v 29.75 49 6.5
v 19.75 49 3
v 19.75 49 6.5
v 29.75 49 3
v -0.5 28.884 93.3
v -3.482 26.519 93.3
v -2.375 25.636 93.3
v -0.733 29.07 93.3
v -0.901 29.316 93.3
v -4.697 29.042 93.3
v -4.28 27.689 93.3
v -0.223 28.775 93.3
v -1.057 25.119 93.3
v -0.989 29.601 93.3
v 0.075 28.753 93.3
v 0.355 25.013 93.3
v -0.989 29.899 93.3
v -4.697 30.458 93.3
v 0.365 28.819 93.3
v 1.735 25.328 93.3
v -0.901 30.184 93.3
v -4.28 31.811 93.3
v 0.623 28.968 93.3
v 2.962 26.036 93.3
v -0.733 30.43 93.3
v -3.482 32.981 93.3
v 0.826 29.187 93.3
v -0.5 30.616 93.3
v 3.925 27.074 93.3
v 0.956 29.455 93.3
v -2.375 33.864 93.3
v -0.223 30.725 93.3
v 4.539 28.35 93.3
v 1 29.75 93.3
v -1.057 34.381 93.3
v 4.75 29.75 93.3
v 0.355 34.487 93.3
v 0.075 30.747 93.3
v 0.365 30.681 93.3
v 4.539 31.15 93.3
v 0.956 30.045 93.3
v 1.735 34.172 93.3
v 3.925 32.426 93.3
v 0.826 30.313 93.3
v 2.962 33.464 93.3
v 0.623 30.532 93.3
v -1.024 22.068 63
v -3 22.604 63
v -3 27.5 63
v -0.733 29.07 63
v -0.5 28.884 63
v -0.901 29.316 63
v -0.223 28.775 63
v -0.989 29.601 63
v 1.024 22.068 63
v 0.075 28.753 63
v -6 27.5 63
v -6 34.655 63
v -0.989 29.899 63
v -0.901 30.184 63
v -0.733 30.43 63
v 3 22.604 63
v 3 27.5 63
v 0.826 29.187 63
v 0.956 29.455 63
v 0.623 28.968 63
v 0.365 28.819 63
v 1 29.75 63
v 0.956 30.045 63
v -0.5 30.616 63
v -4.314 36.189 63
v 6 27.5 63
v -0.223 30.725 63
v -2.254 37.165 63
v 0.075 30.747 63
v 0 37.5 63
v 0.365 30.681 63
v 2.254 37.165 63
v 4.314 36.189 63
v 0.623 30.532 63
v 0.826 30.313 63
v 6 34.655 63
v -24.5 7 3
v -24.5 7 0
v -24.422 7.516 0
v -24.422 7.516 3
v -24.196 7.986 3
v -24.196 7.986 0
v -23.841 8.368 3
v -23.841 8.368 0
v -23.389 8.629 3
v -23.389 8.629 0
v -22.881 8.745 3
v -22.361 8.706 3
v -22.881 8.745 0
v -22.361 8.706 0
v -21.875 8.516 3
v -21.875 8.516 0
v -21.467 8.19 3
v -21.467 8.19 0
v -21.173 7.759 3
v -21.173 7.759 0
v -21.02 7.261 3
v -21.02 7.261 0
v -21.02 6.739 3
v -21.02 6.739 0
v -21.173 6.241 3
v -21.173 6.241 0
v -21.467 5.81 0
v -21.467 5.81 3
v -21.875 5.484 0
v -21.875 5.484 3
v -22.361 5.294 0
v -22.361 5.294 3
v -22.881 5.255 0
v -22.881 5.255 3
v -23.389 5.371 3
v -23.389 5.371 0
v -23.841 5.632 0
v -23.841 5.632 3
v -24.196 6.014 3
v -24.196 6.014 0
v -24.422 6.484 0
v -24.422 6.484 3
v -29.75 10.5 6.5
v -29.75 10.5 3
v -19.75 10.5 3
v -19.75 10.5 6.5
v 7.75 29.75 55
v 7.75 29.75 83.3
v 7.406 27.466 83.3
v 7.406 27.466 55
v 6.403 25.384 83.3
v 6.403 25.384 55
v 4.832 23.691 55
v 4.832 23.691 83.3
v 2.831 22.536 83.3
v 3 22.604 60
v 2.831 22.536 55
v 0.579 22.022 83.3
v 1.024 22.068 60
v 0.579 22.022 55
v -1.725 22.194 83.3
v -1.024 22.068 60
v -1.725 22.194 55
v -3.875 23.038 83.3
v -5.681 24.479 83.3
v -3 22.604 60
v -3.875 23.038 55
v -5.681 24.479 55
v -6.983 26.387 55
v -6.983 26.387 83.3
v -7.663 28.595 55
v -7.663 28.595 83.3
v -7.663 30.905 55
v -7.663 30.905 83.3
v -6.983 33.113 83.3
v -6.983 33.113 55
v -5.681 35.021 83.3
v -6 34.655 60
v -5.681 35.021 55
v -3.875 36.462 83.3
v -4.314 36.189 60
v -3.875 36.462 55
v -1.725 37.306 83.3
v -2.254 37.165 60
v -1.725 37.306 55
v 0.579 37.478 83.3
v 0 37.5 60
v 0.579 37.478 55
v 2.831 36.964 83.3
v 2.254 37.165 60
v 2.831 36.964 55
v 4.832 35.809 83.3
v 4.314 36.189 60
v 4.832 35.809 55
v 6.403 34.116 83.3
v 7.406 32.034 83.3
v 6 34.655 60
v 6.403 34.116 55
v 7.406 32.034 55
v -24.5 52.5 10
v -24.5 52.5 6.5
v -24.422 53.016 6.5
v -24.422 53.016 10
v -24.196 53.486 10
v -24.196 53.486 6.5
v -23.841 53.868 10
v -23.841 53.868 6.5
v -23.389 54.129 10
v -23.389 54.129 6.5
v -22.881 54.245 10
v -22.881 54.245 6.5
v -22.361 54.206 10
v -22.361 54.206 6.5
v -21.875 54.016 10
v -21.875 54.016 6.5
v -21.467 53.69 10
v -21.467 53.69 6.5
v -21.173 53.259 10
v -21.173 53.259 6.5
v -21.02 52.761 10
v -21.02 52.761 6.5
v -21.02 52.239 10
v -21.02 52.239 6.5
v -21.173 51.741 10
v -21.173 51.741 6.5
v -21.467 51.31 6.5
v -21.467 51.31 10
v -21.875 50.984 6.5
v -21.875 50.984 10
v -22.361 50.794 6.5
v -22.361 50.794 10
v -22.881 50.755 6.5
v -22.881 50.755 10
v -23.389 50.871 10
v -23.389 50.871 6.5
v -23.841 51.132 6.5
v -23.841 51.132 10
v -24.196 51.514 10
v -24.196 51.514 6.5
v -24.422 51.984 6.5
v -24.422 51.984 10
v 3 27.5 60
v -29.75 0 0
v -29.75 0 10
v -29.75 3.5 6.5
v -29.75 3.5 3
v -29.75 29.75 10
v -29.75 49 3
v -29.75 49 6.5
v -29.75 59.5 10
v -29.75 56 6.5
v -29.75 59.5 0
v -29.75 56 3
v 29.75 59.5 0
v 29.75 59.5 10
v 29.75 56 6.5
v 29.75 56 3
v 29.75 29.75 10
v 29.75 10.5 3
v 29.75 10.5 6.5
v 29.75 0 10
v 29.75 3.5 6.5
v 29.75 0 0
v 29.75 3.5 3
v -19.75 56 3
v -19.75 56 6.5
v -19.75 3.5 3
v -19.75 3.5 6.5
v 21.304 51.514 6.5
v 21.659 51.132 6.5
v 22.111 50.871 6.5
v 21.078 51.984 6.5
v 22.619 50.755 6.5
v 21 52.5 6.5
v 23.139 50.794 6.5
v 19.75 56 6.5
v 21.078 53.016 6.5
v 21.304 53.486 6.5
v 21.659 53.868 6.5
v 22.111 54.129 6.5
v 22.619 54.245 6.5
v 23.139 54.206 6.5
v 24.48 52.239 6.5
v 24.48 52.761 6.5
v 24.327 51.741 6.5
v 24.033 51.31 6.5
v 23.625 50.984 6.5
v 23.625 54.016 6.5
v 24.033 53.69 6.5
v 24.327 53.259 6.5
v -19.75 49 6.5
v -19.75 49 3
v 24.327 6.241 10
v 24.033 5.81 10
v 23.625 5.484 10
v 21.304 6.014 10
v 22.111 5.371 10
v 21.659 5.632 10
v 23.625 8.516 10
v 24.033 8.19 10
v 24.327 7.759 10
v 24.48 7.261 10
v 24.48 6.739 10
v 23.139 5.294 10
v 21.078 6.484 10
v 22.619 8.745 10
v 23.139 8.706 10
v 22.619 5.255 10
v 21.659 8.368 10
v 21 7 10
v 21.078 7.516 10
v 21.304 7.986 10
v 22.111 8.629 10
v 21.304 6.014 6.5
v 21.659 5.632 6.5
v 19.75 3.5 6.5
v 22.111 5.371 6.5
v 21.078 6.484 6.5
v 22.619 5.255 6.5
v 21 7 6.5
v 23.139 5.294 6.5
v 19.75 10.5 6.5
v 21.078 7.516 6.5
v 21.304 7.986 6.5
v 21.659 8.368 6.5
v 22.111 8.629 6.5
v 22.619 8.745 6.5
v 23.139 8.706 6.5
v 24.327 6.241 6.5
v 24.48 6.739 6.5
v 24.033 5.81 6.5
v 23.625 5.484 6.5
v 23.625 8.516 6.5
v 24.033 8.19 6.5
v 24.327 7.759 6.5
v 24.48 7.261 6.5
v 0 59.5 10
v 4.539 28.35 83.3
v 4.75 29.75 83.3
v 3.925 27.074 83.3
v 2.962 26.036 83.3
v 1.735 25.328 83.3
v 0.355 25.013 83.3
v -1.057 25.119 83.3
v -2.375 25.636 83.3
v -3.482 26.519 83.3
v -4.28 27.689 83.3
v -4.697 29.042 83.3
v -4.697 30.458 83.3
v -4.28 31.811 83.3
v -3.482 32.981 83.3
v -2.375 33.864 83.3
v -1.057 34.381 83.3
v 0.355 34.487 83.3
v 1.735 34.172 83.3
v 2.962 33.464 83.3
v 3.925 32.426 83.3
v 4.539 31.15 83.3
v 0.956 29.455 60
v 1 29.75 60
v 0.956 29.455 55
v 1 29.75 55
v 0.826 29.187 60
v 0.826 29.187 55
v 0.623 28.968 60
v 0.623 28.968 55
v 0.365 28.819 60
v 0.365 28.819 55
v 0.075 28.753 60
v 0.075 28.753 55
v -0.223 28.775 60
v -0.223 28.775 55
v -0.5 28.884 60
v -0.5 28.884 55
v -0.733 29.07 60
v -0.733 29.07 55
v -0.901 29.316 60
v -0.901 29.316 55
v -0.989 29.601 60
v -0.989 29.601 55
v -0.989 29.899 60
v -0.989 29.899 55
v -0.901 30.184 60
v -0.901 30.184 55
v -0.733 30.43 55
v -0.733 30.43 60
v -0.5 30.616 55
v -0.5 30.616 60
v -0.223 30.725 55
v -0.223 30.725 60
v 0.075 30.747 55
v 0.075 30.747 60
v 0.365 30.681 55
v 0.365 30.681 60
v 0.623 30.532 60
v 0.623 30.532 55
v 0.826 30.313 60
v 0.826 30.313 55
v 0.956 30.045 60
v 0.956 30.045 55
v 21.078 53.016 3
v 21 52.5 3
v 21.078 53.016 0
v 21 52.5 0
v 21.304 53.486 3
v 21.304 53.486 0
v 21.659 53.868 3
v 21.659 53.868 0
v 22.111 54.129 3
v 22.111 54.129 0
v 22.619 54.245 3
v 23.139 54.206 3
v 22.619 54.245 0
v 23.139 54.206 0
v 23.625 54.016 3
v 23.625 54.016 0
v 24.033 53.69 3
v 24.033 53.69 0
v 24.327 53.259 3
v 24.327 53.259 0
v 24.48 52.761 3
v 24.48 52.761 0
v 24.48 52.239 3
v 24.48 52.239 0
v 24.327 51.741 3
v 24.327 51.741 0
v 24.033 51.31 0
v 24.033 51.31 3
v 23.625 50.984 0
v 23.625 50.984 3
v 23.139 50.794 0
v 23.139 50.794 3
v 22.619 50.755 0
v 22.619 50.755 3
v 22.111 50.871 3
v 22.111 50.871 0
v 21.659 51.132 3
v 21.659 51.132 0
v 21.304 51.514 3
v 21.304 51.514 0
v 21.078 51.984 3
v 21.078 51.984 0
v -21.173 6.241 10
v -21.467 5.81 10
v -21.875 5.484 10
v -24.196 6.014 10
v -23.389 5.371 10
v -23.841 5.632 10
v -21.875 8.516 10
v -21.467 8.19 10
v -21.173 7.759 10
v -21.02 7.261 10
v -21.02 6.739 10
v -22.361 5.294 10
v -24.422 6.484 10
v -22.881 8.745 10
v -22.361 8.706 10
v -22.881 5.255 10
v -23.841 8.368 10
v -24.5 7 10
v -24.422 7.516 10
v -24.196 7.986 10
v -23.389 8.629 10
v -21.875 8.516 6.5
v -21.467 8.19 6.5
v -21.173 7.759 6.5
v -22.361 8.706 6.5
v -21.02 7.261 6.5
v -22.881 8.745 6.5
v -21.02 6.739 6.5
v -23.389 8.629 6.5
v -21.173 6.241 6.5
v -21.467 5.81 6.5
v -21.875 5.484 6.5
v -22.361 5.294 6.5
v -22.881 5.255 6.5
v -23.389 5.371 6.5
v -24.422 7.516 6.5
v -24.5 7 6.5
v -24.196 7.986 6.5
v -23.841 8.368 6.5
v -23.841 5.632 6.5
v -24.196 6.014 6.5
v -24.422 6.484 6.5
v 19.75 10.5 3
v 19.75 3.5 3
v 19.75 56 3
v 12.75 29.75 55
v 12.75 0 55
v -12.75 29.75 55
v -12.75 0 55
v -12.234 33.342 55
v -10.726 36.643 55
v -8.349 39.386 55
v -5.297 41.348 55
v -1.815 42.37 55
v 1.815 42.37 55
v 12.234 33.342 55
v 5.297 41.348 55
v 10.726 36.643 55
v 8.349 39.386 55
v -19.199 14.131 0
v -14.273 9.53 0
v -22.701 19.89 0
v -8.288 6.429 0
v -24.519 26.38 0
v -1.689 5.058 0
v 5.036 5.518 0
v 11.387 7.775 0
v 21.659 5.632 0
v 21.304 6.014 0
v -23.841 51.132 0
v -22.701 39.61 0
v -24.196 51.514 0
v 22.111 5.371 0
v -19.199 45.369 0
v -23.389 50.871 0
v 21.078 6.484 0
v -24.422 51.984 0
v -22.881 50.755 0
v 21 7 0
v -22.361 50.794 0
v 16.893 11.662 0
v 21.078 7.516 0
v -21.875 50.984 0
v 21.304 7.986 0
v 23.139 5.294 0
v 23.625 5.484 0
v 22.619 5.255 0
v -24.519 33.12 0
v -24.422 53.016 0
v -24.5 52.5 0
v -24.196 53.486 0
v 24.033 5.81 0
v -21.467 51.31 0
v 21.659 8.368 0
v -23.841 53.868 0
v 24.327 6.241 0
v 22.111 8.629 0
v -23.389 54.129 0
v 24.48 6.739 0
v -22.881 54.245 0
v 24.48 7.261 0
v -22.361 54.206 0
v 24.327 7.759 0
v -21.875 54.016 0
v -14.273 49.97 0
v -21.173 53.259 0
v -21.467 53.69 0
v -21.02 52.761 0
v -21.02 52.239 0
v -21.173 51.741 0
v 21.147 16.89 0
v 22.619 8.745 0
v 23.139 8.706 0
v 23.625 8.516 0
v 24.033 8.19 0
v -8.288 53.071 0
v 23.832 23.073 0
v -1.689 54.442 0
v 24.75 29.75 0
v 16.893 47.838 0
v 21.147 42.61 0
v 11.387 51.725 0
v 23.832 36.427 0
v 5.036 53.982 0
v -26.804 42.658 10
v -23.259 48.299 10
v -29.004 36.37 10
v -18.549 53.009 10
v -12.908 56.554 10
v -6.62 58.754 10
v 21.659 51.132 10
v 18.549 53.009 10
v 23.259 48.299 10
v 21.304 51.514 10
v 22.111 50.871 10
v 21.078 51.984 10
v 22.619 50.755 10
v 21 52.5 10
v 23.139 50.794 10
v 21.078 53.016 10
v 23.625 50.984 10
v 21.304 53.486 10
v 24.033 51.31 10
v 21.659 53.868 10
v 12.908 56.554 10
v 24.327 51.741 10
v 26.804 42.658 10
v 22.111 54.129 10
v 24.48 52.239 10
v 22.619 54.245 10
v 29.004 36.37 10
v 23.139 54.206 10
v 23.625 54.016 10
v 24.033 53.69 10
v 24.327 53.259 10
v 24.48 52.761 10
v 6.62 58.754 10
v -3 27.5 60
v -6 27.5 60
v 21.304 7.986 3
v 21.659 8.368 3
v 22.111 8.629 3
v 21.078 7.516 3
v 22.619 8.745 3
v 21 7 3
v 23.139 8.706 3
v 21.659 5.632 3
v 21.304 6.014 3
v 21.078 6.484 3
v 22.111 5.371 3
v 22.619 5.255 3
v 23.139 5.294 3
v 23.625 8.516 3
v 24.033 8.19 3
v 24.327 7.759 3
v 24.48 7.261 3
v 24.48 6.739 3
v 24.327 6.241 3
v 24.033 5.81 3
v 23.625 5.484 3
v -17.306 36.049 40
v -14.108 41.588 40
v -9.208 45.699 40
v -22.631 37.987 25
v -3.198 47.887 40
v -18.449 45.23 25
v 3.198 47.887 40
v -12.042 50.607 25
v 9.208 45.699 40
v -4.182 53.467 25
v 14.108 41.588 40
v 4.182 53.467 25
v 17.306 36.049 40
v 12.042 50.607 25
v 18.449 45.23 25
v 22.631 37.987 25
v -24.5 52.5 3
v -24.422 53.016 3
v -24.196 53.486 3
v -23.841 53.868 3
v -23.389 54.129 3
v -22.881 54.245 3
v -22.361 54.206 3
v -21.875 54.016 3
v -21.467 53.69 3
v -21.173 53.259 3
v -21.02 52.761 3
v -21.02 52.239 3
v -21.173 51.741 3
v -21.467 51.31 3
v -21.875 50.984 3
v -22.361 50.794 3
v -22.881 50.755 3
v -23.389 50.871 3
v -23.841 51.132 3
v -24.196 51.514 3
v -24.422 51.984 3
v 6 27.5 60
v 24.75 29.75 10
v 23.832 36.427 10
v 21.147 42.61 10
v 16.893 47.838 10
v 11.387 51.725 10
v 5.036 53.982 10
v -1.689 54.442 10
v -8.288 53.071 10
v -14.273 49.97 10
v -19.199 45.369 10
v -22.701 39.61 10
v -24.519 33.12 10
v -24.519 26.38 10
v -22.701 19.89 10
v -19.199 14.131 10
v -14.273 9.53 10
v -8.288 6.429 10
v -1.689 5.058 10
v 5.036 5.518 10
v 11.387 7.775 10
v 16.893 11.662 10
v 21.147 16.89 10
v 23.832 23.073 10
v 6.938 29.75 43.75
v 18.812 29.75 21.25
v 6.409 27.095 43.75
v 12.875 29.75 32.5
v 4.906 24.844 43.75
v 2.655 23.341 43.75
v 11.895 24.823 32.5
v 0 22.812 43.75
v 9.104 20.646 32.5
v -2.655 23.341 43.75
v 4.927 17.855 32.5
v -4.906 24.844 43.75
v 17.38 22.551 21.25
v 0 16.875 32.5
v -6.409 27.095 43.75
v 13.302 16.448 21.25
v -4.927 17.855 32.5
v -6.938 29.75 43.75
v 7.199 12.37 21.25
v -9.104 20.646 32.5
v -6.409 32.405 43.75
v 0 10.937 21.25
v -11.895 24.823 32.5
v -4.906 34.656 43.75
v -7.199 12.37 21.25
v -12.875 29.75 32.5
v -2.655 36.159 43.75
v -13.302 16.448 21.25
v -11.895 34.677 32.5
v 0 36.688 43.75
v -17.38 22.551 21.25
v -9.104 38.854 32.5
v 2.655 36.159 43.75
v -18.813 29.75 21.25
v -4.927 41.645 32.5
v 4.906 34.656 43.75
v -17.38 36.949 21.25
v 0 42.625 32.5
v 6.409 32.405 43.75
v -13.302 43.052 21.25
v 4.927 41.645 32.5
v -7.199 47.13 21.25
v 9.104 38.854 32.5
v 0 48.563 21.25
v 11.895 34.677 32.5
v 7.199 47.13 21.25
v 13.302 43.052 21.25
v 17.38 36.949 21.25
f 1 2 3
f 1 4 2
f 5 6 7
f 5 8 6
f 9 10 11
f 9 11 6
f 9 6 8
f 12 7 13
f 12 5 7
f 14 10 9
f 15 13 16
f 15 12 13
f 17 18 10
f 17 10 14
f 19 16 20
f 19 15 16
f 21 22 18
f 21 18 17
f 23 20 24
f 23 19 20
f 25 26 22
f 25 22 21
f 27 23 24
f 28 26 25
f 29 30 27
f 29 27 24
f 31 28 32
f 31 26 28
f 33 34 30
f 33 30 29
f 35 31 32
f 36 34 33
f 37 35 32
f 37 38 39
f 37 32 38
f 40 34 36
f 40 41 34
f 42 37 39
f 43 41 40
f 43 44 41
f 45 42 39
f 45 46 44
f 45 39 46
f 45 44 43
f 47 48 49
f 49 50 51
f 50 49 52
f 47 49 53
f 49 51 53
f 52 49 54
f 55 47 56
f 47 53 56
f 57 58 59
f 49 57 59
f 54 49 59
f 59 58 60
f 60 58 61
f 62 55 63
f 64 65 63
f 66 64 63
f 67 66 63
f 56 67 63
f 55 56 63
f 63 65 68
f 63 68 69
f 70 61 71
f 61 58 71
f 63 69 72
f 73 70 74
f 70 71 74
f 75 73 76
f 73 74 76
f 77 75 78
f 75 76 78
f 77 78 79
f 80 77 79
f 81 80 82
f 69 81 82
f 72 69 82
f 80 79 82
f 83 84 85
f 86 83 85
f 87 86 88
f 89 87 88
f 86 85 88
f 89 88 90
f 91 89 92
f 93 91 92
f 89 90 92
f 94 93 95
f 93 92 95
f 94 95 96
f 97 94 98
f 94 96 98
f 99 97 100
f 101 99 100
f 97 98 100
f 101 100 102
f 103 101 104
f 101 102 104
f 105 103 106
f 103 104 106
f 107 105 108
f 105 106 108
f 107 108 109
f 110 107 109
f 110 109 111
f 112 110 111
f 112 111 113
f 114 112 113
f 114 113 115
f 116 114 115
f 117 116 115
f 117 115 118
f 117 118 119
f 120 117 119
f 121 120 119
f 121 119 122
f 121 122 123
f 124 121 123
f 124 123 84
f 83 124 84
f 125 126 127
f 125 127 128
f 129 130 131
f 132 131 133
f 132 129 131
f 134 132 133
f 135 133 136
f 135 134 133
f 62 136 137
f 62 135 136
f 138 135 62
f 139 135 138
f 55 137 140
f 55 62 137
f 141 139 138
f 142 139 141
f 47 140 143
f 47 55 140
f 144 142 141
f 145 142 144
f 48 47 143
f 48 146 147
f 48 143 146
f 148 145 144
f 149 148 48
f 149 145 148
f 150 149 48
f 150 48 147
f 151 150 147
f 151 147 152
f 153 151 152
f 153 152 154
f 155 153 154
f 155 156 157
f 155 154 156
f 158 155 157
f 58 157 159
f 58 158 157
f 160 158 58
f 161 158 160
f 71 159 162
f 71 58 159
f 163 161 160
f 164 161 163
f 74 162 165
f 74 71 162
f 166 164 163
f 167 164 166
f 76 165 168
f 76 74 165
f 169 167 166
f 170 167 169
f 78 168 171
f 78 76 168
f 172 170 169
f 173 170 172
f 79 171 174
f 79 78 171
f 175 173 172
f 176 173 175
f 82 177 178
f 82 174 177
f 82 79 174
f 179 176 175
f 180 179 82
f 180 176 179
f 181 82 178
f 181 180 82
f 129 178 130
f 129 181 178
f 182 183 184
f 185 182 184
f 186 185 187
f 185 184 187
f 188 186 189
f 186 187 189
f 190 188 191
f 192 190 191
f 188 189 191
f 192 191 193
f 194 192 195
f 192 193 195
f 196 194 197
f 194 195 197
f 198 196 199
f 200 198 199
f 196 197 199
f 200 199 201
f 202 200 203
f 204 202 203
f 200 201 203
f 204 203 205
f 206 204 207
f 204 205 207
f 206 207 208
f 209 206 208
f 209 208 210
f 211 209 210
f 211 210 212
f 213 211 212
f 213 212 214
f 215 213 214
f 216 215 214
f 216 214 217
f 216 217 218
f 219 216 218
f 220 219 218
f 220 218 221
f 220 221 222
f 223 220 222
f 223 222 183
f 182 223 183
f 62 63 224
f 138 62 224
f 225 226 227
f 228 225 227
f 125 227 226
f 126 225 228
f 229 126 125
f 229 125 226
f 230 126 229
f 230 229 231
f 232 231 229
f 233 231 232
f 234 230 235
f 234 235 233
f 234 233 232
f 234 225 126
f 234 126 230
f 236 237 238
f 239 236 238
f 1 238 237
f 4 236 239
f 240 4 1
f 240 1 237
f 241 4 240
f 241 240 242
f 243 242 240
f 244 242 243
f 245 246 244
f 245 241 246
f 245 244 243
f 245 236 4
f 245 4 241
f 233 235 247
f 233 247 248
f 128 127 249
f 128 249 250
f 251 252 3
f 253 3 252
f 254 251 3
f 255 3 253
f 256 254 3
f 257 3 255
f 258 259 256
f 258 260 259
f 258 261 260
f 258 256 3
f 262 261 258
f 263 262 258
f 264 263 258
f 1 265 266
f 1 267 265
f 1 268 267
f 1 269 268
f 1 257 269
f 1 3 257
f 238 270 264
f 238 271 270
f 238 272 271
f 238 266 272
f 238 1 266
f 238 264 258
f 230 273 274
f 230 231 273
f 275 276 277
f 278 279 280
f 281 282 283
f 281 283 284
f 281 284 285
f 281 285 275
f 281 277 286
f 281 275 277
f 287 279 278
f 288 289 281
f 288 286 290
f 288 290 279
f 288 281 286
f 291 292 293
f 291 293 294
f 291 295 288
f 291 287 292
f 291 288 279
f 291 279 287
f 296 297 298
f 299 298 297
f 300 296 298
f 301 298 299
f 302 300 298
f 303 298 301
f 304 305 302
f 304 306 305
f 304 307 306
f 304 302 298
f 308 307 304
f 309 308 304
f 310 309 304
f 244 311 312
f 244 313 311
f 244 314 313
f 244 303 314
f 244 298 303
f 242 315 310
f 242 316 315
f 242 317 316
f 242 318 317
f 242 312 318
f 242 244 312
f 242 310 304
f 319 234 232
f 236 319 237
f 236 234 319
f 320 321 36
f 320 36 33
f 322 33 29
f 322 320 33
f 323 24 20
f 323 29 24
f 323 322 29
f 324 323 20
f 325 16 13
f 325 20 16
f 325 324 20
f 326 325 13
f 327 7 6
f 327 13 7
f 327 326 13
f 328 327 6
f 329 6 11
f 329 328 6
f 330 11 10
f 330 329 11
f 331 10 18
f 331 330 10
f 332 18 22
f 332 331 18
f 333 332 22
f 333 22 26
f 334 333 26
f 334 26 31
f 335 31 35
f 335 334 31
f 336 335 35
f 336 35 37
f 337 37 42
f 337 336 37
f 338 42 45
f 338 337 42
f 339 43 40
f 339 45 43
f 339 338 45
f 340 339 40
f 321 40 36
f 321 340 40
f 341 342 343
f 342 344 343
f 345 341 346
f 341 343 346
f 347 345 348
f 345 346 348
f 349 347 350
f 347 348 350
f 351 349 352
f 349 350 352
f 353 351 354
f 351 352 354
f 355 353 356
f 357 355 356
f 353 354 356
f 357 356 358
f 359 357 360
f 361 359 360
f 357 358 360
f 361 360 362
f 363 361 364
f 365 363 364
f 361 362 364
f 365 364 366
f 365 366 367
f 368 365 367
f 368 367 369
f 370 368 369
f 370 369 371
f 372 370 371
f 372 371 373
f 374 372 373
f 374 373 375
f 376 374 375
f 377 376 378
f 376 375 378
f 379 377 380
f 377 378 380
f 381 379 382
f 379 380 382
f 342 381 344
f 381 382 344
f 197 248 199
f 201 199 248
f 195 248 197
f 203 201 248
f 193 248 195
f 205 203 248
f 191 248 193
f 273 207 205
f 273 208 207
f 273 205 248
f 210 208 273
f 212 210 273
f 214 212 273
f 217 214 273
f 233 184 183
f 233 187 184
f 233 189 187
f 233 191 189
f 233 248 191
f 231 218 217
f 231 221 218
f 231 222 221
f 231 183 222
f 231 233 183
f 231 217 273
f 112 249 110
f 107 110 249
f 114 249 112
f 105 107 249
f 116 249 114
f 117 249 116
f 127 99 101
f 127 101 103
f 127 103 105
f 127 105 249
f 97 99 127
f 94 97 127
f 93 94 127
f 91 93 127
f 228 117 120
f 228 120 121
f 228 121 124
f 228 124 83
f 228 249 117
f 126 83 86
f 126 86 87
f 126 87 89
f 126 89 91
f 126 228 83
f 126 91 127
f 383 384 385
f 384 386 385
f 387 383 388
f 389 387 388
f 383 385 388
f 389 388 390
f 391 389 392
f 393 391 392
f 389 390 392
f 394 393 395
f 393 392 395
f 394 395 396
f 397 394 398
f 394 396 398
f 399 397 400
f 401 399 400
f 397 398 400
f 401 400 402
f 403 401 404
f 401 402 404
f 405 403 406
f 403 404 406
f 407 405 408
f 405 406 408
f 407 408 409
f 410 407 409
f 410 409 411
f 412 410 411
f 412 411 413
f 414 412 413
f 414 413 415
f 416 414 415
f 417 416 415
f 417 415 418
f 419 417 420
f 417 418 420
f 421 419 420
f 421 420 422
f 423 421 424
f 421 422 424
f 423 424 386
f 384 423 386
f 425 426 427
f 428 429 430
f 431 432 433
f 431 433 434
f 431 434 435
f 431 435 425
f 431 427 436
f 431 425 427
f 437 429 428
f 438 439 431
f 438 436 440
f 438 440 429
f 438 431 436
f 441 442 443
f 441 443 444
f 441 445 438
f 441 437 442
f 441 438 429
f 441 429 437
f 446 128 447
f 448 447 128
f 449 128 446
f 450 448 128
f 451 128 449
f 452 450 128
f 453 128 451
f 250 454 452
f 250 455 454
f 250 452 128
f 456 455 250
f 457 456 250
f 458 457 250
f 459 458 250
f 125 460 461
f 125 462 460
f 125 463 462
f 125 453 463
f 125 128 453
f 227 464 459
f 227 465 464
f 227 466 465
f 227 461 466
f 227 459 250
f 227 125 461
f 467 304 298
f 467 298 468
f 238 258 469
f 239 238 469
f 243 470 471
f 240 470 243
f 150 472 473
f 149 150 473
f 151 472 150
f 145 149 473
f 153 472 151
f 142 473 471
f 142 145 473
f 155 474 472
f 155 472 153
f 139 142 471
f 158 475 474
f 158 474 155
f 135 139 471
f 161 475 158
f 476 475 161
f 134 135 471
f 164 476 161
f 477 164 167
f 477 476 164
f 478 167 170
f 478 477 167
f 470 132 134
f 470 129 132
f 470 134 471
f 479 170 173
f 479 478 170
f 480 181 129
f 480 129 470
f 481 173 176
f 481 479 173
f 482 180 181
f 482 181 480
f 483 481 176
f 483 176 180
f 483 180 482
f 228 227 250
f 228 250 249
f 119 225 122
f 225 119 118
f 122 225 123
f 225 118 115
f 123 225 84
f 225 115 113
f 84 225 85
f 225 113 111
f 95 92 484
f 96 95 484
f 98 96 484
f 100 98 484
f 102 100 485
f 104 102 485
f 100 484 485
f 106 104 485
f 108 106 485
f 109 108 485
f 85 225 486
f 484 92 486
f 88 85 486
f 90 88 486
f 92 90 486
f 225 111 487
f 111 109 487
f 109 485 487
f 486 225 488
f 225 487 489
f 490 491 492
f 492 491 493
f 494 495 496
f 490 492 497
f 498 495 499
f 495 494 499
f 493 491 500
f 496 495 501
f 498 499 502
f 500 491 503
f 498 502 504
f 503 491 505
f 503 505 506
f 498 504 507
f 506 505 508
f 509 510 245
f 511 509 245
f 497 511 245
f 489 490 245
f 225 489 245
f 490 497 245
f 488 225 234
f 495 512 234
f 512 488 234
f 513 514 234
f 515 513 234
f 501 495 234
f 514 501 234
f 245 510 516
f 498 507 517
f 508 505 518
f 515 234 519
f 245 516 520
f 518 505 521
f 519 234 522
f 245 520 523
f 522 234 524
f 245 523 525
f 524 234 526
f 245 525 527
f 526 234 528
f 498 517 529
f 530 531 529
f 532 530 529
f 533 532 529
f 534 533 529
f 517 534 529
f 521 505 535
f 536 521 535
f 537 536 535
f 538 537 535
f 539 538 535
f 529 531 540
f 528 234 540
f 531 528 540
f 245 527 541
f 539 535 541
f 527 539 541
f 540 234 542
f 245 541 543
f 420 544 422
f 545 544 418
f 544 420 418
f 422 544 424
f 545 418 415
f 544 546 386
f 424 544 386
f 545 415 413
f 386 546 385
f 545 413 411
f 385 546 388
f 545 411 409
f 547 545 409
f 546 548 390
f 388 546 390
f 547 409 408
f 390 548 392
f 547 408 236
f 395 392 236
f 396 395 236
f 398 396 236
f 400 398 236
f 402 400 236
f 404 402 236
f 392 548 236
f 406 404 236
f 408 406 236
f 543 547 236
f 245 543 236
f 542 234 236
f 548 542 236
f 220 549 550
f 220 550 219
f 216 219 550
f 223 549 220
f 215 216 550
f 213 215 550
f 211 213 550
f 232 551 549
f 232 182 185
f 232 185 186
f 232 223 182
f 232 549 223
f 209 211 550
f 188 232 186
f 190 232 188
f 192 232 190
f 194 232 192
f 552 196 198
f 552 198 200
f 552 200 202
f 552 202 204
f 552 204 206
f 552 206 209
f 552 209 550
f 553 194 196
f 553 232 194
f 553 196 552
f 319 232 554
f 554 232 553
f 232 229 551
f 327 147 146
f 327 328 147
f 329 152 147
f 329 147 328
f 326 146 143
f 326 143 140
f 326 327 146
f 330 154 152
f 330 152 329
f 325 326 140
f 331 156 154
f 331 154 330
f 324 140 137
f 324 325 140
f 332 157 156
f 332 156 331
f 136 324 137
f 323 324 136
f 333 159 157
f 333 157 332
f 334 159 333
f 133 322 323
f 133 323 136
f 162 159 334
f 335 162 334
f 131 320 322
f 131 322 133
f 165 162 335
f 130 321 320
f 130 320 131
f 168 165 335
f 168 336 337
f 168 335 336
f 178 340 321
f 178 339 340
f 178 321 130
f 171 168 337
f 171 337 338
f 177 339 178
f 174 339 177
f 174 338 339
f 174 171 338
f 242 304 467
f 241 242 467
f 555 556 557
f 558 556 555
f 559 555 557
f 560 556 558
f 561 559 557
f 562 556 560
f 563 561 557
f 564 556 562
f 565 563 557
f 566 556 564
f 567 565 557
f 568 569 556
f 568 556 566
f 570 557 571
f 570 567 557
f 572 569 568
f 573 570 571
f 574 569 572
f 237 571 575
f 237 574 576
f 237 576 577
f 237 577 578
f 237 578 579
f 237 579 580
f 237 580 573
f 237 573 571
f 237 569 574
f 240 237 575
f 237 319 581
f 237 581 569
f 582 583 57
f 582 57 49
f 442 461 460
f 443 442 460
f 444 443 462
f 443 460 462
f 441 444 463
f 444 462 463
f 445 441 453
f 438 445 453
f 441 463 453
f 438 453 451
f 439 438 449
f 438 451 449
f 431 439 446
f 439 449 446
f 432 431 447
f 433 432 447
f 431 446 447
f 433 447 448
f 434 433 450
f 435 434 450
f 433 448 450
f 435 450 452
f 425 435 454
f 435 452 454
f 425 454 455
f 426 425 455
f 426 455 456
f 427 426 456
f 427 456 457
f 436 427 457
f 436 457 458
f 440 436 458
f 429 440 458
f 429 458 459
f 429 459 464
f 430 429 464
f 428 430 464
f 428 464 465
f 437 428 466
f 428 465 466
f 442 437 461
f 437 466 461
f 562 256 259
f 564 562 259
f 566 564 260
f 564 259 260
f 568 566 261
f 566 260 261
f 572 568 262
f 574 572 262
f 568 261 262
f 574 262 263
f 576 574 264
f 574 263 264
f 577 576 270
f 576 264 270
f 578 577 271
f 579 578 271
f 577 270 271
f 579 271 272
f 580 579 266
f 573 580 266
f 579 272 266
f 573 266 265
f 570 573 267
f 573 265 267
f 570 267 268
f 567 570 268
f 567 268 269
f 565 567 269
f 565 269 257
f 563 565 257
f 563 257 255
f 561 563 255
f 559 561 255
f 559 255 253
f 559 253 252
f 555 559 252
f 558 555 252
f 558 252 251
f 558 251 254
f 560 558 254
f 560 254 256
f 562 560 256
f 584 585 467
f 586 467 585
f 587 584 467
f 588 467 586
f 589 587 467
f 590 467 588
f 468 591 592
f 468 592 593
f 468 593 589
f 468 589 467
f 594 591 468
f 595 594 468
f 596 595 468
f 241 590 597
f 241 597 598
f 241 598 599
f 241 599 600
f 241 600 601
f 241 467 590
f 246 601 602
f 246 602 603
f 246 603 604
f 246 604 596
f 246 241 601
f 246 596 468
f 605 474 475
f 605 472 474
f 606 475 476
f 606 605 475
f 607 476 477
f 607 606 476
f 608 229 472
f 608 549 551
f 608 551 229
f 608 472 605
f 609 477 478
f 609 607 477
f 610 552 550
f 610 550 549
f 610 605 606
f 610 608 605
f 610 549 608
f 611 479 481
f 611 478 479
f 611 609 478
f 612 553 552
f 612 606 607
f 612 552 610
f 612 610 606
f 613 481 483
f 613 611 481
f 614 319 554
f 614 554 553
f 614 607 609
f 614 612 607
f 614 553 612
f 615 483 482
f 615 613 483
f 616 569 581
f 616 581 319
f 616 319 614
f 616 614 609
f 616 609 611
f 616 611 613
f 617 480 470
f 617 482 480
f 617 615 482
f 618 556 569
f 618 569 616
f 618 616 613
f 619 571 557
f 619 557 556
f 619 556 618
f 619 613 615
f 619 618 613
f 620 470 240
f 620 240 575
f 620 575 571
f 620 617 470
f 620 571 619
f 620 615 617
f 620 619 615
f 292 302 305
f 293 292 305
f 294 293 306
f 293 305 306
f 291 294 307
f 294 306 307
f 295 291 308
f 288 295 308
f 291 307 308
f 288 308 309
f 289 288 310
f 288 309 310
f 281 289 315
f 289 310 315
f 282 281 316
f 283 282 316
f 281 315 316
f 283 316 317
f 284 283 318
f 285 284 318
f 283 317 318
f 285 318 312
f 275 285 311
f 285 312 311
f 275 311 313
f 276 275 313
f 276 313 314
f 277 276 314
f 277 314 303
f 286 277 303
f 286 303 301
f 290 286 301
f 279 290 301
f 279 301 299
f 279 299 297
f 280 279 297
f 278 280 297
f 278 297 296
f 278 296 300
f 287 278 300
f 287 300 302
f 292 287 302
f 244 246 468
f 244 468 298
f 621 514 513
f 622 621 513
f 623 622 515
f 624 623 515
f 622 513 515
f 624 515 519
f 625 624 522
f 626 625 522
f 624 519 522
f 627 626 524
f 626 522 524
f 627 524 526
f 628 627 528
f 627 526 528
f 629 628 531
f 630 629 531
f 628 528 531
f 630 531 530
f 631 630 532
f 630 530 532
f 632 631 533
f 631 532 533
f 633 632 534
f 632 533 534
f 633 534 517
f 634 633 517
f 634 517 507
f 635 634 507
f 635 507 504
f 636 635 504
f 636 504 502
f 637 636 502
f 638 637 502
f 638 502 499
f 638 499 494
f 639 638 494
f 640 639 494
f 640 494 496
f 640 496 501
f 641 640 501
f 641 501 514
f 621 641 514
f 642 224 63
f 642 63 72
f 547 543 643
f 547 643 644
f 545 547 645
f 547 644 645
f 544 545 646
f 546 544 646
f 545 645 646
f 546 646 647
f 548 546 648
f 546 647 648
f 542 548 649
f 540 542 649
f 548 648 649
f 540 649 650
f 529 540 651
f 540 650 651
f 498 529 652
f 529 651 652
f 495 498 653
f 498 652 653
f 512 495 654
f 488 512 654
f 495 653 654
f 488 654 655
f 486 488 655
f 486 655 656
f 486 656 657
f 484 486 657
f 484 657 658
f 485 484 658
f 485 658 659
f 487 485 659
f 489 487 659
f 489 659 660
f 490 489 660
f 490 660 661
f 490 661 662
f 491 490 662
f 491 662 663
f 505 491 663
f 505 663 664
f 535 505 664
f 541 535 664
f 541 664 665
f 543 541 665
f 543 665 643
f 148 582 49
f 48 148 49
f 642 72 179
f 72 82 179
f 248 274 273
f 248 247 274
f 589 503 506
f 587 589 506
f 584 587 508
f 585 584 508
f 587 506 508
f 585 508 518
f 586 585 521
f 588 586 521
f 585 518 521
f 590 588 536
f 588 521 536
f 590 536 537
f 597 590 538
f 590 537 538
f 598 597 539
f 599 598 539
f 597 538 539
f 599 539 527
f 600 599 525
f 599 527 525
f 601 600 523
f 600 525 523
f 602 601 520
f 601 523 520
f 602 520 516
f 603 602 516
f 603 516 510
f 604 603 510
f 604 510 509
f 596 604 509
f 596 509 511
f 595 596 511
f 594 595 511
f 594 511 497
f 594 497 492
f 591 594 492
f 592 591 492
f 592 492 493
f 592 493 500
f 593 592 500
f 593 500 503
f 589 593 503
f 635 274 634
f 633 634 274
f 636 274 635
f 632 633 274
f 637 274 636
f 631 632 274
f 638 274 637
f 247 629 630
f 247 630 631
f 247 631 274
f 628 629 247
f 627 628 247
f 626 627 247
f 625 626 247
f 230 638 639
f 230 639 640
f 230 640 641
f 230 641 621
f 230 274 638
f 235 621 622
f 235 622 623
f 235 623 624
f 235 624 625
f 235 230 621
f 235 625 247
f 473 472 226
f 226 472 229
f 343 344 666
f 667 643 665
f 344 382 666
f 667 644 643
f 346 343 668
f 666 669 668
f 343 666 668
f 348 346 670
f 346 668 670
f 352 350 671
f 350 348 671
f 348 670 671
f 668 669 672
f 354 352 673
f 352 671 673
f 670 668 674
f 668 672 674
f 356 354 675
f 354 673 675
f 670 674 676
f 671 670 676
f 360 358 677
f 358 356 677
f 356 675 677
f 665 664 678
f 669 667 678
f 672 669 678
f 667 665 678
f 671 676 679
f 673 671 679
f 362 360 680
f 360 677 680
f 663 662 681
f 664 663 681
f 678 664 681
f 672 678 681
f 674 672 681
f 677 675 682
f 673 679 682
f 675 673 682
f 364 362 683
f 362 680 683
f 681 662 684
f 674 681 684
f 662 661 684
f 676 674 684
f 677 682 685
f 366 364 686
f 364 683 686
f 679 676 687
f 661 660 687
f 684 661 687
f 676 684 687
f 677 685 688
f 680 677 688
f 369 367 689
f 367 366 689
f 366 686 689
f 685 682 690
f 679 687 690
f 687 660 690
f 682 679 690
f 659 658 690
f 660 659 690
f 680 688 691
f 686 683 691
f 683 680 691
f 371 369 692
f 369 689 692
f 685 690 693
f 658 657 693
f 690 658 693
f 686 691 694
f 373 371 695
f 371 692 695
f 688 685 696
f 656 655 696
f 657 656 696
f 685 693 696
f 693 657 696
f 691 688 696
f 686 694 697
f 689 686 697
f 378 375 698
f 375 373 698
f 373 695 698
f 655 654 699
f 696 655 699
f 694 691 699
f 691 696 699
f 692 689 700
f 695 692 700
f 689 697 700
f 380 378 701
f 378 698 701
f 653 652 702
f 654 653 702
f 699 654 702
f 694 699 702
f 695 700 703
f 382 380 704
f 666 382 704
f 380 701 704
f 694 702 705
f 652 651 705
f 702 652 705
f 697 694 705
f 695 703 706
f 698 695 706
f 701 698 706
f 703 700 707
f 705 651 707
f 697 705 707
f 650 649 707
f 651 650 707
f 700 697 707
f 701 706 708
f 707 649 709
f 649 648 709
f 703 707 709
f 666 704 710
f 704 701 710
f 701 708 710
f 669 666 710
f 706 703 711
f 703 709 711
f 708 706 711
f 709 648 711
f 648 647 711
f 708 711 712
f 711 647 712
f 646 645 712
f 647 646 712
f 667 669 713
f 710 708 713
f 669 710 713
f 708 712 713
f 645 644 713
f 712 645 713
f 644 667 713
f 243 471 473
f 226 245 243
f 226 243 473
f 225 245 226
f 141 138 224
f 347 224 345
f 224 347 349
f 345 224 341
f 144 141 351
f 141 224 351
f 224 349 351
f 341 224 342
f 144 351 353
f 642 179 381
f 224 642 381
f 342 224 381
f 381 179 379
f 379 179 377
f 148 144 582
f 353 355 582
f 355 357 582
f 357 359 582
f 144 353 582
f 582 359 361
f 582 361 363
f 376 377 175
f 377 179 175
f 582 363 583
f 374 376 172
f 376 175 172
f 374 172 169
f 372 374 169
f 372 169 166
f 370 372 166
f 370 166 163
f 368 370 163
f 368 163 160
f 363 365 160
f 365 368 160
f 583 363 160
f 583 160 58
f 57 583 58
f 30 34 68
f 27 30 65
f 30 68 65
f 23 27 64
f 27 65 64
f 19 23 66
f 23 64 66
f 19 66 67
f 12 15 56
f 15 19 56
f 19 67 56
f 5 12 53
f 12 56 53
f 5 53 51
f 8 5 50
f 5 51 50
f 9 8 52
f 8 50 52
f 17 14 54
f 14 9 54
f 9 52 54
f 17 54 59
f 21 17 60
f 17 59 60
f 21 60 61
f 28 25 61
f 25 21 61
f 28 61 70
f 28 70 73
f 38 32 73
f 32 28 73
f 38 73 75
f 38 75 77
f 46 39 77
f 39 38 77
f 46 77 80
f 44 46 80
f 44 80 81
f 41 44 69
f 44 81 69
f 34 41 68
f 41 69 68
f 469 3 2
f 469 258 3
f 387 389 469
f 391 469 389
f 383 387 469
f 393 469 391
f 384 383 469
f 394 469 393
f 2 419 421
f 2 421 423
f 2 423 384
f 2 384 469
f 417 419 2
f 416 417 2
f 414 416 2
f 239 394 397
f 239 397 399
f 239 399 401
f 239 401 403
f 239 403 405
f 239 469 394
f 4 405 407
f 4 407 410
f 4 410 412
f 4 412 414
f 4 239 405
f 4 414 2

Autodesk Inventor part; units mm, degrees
ref_plane "YZ Plane" through (0, 0, 0) normal (1, 0, 0) x (0, 1, 0)
ref_plane "XZ Plane" through (0, 0, 0) normal (0, 1, 0) x (-1, 0, 0)
sketch "Sketch2" plane through (0, 0, 0) normal (0, 0, 1) x (1, 0, 0)
  line L0 (-29.75, 59.5) -> (29.75, 59.5)
  line L1 (29.75, 59.5) -> (29.75, 0)
  line L2 (29.75, 0) -> (-29.75, 0)
  line L3 (-29.75, 0) -> (-29.75, 59.5)
  point P0 (0, 0)
  point P1 (0, 0)
  dimension "d0" = 59.5
extrude "Extrusion1" add sketch "Sketch2" along normal blind 55
sketch "Sketch3" plane through (0, 0, 55) normal (0, 0, 1) x (1, 0, 0)
  circle A0 centre (0, 29.75) radius 1
  circle A1 centre (0, 29.75) radius 7.75
  line L0 (0, 0) -> (0, 59.5) construction
  line L1 (29.75, 59.5) -> (-29.75, 59.5) construction
  line L2 (29.75, 0) -> (29.75, 59.5) construction
  line L3 (29.75, 29.75) -> (-29.75, 29.75) construction
  line L4 (-29.75, 59.5) -> (-29.75, 0) construction
  line L5 (-29.75, 0) -> (29.75, 0) projected
  dimension "d3" = 15.5
  dimension "d5" = 2
  dimension "d47" = 22
extrude "Extrusion2" add sketch "Sketch3" along normal blind 28.3
sketch "Sketch4" plane through (0, 29.75, 83.3) normal (0, 0, 1) x (1, 0, 0)
  circle A0 centre (0, 0) radius 1
  circle A1 centre (0, 0) radius 4.75
  circle A2 centre (0, 0) radius 1 projected
  point P0 (0, -29.75)
  dimension "d8" = 9.5
extrude "Extrusion3" add sketch "Sketch4" along normal blind 10
sketch "Sketch10" plane through (0, 0, 0) normal (0, 0, -1) x (-1, 0, 0)
  circle A0 centre (-22.75, 52.5) radius 1.75
  circle A1 centre (-22.75, 7) radius 1.75
  circle A2 centre (22.75, 52.5) radius 1.75
  circle A3 centre (22.75, 7) radius 1.75
  line L0 (-29.75, 59.5) -> (-29.75, 0) projected
  line L1 (29.75, 59.5) -> (-29.75, 59.5) projected
  line L2 (-29.75, 29.75) -> (29.75, 29.75) construction
  line L3 (29.75, 0) -> (29.75, 59.5) construction
  line L4 (0, 59.5) -> (0, 0) construction
  dimension "d29" = 7
  dimension "d30" = 7
  dimension "d33" = 3.5
extrude "Extrusion5" cut sketch "Sketch10" against normal blind 10
sketch "Sketch9" plane through (29.75, 0, 0) normal (1, 0, 0) x (0, 0, -1)
  line L0 (-6.5, 56) -> (-3, 56)
  line L1 (-3, 56) -> (-3, 49)
  line L2 (-3, 49) -> (-6.5, 49)
  line L3 (-6.5, 49) -> (-6.5, 56)
  line L4 (-6.5, 10.5) -> (-3, 10.5)
  line L5 (-3, 10.5) -> (-3, 3.5)
  line L6 (-3, 3.5) -> (-6.5, 3.5)
  line L7 (-6.5, 3.5) -> (-6.5, 10.5)
  line L8 (0, 59.5) -> (-55, 59.5) projected
  line L9 (-55, 0) -> (-55, 59.5) construction
  line L10 (-55, 29.75) -> (0, 29.75) construction
  line L11 (0, 0) -> (0, 59.5) construction
  line L12 (0, 54.25) -> (0, 50.75) projected
  line L13 (0, 52.5) -> (-10, 52.5) construction
  line L14 (-10, 54.25) -> (-10, 50.75) projected
  dimension "d24" = 7
  dimension "d25" = 3.5
  dimension "d26" = 3
extrude "Extrusion4" cut sketch "Sketch9" against normal blind 10
mirror "Mirror1" about plane through (0, 0, 0) normal (1, 0, 0) of "Extrusion4"
ref_plane "Work Plane1" through (0, 0, 10) normal (0, 0, 1) x (1, 0, 0)
sketch "Sketch11" plane through (0, 0, 10) normal (0, 0, 1) x (1, 0, 0)
  circle A0 centre (0, 29.75) radius 24.75
  circle A1 centre (0, 29.75) radius 1 projected
  line L0 (-29.75, 59.5) -> (29.75, 59.5) projected
  point P0 (0, 0)
  dimension "d49" = 5
extrude "Extrusion6" cut sketch "Sketch11" against normal through all contours A0 | A1
loft "Loft2" cut section 1 edges at (-24.75, 29.75, 10) section 2 edges at (-1, 29.75, 55)
sketch "Sketch7" plane through (-29.75, 59.5, 0) normal (0, 1, 0) x (1, 0, 0)
  line L0 (35.75, -60) -> (23.75, -60)
  line L1 (23.75, -60) -> (23.75, -63)
  line L2 (23.75, -63) -> (35.75, -63)
  line L3 (35.75, -63) -> (35.75, -60)
  line L4 (29.75, -60) -> (29.75, -63) construction
  line L5 (26.5, -55) -> (28.5, -55) construction
  line L6 (29.75, -55) -> (29.75, -83.3) construction
  line L7 (59.5, -55) -> (0, -55) construction
  line L8 (22, -83.3) -> (37.5, -83.3) projected
  point P0 (29.75, 0)
  dimension "d16" = 3
  dimension "d17" = 12
  dimension "d18" = 5
extrude "Extrusion7" cut sketch "Sketch7" against normal blind 32
sketch "Sketch12" plane through (-29.75, 27.5, 0) normal (0, 1, 0) x (1, 0, 0)
  line L0 (32.75, -60) -> (26.75, -60)
  line L1 (26.75, -60) -> (26.75, -63)
  line L2 (26.75, -63) -> (32.75, -63)
  line L3 (32.75, -63) -> (32.75, -60)
  line L4 (35.75, -60) -> (35.75, -63) projected
  line L5 (35.75, -63) -> (23.75, -63) projected
  line L6 (28.75, -60) -> (30.75, -60) construction
  line L7 (29.75, -60) -> (29.75, -63) construction
  line L8 (30.75, -63) -> (28.75, -63) construction
  point P0 (29.75, 0)
  point P1 (22.3338, -63)
  dimension "d44" = 6
extrude "Extrusion8" cut sketch "Sketch12" against normal through all
sketch "Sketch14" plane through (0, 0, 0) normal (1, 0, 0) x (0, 1, 0)
  line L0 (59.5, 10) -> (42.5, 55)
  line L1 (42.5, 55) -> (79.5, 55)
  line L2 (79.5, 10) -> (79.5, 55)
  line L3 (59.5, 55) -> (0, 55) projected
  line L4 (37.5, 55) -> (37.5, 83.3) projected
  line L5 (59.5, 0) -> (59.5, 55) projected
  line L6 (5, 10) -> (54.5, 10) projected
  line L7 (79.5, 10) -> (59.5, 10)
  line L8 (59.5, 0) -> (59.5, 55) projected
  line L9 (54.25, 10) -> (50.75, 10) projected
  line L10 (29.75, -18.66) -> (29.75, 111.96) projected
  point P0 (0, 0)
  point P1 (55, 37.5)
  point P2 (55, 37.5)
  dimension "d54" = 5
  dimension "d55" = 20
revolve "Revolution1" cut sketch "Sketch14" angle 180 mid plane about axis through (0, 29.75, 55) along (0, 0, 1)
sketch "Sketch15" plane through (12.75, 29.75, 55) normal (0, 1, 0) x (1, 0, 0)
  line L0 (-42.5, 0) -> (-25.5, 0)
  line L1 (-25.5, 0) -> (0, 0)
  line L2 (-42.5, 0) -> (17, 0) projected
  line L3 (0, 0) -> (17, 0)
  line L4 (17, 0) -> (17, 45)
  line L5 (17, 55) -> (17, 0) projected
  line L6 (0, 0) -> (17, 45)
  line L7 (0, 0) -> (17, 45) projected
  line L8 (17, 45) -> (-25.5, 0)
  line L9 (-25.5, 0) -> (-42.5, 45)
  line L10 (-42.5, 45) -> (-25.5, 0) projected
  line L11 (-42.5, 0) -> (-42.5, 45)
  line L12 (-42.5, 55) -> (-42.5, 0) projected
  point P0 (-12.75, 55)
extrude "Extrusion10" cut sketch "Sketch15" against normal through all contours L11 L9 L0 | L6 L4 L2
properties part number "Power_Meter_Adapter_Part1"
